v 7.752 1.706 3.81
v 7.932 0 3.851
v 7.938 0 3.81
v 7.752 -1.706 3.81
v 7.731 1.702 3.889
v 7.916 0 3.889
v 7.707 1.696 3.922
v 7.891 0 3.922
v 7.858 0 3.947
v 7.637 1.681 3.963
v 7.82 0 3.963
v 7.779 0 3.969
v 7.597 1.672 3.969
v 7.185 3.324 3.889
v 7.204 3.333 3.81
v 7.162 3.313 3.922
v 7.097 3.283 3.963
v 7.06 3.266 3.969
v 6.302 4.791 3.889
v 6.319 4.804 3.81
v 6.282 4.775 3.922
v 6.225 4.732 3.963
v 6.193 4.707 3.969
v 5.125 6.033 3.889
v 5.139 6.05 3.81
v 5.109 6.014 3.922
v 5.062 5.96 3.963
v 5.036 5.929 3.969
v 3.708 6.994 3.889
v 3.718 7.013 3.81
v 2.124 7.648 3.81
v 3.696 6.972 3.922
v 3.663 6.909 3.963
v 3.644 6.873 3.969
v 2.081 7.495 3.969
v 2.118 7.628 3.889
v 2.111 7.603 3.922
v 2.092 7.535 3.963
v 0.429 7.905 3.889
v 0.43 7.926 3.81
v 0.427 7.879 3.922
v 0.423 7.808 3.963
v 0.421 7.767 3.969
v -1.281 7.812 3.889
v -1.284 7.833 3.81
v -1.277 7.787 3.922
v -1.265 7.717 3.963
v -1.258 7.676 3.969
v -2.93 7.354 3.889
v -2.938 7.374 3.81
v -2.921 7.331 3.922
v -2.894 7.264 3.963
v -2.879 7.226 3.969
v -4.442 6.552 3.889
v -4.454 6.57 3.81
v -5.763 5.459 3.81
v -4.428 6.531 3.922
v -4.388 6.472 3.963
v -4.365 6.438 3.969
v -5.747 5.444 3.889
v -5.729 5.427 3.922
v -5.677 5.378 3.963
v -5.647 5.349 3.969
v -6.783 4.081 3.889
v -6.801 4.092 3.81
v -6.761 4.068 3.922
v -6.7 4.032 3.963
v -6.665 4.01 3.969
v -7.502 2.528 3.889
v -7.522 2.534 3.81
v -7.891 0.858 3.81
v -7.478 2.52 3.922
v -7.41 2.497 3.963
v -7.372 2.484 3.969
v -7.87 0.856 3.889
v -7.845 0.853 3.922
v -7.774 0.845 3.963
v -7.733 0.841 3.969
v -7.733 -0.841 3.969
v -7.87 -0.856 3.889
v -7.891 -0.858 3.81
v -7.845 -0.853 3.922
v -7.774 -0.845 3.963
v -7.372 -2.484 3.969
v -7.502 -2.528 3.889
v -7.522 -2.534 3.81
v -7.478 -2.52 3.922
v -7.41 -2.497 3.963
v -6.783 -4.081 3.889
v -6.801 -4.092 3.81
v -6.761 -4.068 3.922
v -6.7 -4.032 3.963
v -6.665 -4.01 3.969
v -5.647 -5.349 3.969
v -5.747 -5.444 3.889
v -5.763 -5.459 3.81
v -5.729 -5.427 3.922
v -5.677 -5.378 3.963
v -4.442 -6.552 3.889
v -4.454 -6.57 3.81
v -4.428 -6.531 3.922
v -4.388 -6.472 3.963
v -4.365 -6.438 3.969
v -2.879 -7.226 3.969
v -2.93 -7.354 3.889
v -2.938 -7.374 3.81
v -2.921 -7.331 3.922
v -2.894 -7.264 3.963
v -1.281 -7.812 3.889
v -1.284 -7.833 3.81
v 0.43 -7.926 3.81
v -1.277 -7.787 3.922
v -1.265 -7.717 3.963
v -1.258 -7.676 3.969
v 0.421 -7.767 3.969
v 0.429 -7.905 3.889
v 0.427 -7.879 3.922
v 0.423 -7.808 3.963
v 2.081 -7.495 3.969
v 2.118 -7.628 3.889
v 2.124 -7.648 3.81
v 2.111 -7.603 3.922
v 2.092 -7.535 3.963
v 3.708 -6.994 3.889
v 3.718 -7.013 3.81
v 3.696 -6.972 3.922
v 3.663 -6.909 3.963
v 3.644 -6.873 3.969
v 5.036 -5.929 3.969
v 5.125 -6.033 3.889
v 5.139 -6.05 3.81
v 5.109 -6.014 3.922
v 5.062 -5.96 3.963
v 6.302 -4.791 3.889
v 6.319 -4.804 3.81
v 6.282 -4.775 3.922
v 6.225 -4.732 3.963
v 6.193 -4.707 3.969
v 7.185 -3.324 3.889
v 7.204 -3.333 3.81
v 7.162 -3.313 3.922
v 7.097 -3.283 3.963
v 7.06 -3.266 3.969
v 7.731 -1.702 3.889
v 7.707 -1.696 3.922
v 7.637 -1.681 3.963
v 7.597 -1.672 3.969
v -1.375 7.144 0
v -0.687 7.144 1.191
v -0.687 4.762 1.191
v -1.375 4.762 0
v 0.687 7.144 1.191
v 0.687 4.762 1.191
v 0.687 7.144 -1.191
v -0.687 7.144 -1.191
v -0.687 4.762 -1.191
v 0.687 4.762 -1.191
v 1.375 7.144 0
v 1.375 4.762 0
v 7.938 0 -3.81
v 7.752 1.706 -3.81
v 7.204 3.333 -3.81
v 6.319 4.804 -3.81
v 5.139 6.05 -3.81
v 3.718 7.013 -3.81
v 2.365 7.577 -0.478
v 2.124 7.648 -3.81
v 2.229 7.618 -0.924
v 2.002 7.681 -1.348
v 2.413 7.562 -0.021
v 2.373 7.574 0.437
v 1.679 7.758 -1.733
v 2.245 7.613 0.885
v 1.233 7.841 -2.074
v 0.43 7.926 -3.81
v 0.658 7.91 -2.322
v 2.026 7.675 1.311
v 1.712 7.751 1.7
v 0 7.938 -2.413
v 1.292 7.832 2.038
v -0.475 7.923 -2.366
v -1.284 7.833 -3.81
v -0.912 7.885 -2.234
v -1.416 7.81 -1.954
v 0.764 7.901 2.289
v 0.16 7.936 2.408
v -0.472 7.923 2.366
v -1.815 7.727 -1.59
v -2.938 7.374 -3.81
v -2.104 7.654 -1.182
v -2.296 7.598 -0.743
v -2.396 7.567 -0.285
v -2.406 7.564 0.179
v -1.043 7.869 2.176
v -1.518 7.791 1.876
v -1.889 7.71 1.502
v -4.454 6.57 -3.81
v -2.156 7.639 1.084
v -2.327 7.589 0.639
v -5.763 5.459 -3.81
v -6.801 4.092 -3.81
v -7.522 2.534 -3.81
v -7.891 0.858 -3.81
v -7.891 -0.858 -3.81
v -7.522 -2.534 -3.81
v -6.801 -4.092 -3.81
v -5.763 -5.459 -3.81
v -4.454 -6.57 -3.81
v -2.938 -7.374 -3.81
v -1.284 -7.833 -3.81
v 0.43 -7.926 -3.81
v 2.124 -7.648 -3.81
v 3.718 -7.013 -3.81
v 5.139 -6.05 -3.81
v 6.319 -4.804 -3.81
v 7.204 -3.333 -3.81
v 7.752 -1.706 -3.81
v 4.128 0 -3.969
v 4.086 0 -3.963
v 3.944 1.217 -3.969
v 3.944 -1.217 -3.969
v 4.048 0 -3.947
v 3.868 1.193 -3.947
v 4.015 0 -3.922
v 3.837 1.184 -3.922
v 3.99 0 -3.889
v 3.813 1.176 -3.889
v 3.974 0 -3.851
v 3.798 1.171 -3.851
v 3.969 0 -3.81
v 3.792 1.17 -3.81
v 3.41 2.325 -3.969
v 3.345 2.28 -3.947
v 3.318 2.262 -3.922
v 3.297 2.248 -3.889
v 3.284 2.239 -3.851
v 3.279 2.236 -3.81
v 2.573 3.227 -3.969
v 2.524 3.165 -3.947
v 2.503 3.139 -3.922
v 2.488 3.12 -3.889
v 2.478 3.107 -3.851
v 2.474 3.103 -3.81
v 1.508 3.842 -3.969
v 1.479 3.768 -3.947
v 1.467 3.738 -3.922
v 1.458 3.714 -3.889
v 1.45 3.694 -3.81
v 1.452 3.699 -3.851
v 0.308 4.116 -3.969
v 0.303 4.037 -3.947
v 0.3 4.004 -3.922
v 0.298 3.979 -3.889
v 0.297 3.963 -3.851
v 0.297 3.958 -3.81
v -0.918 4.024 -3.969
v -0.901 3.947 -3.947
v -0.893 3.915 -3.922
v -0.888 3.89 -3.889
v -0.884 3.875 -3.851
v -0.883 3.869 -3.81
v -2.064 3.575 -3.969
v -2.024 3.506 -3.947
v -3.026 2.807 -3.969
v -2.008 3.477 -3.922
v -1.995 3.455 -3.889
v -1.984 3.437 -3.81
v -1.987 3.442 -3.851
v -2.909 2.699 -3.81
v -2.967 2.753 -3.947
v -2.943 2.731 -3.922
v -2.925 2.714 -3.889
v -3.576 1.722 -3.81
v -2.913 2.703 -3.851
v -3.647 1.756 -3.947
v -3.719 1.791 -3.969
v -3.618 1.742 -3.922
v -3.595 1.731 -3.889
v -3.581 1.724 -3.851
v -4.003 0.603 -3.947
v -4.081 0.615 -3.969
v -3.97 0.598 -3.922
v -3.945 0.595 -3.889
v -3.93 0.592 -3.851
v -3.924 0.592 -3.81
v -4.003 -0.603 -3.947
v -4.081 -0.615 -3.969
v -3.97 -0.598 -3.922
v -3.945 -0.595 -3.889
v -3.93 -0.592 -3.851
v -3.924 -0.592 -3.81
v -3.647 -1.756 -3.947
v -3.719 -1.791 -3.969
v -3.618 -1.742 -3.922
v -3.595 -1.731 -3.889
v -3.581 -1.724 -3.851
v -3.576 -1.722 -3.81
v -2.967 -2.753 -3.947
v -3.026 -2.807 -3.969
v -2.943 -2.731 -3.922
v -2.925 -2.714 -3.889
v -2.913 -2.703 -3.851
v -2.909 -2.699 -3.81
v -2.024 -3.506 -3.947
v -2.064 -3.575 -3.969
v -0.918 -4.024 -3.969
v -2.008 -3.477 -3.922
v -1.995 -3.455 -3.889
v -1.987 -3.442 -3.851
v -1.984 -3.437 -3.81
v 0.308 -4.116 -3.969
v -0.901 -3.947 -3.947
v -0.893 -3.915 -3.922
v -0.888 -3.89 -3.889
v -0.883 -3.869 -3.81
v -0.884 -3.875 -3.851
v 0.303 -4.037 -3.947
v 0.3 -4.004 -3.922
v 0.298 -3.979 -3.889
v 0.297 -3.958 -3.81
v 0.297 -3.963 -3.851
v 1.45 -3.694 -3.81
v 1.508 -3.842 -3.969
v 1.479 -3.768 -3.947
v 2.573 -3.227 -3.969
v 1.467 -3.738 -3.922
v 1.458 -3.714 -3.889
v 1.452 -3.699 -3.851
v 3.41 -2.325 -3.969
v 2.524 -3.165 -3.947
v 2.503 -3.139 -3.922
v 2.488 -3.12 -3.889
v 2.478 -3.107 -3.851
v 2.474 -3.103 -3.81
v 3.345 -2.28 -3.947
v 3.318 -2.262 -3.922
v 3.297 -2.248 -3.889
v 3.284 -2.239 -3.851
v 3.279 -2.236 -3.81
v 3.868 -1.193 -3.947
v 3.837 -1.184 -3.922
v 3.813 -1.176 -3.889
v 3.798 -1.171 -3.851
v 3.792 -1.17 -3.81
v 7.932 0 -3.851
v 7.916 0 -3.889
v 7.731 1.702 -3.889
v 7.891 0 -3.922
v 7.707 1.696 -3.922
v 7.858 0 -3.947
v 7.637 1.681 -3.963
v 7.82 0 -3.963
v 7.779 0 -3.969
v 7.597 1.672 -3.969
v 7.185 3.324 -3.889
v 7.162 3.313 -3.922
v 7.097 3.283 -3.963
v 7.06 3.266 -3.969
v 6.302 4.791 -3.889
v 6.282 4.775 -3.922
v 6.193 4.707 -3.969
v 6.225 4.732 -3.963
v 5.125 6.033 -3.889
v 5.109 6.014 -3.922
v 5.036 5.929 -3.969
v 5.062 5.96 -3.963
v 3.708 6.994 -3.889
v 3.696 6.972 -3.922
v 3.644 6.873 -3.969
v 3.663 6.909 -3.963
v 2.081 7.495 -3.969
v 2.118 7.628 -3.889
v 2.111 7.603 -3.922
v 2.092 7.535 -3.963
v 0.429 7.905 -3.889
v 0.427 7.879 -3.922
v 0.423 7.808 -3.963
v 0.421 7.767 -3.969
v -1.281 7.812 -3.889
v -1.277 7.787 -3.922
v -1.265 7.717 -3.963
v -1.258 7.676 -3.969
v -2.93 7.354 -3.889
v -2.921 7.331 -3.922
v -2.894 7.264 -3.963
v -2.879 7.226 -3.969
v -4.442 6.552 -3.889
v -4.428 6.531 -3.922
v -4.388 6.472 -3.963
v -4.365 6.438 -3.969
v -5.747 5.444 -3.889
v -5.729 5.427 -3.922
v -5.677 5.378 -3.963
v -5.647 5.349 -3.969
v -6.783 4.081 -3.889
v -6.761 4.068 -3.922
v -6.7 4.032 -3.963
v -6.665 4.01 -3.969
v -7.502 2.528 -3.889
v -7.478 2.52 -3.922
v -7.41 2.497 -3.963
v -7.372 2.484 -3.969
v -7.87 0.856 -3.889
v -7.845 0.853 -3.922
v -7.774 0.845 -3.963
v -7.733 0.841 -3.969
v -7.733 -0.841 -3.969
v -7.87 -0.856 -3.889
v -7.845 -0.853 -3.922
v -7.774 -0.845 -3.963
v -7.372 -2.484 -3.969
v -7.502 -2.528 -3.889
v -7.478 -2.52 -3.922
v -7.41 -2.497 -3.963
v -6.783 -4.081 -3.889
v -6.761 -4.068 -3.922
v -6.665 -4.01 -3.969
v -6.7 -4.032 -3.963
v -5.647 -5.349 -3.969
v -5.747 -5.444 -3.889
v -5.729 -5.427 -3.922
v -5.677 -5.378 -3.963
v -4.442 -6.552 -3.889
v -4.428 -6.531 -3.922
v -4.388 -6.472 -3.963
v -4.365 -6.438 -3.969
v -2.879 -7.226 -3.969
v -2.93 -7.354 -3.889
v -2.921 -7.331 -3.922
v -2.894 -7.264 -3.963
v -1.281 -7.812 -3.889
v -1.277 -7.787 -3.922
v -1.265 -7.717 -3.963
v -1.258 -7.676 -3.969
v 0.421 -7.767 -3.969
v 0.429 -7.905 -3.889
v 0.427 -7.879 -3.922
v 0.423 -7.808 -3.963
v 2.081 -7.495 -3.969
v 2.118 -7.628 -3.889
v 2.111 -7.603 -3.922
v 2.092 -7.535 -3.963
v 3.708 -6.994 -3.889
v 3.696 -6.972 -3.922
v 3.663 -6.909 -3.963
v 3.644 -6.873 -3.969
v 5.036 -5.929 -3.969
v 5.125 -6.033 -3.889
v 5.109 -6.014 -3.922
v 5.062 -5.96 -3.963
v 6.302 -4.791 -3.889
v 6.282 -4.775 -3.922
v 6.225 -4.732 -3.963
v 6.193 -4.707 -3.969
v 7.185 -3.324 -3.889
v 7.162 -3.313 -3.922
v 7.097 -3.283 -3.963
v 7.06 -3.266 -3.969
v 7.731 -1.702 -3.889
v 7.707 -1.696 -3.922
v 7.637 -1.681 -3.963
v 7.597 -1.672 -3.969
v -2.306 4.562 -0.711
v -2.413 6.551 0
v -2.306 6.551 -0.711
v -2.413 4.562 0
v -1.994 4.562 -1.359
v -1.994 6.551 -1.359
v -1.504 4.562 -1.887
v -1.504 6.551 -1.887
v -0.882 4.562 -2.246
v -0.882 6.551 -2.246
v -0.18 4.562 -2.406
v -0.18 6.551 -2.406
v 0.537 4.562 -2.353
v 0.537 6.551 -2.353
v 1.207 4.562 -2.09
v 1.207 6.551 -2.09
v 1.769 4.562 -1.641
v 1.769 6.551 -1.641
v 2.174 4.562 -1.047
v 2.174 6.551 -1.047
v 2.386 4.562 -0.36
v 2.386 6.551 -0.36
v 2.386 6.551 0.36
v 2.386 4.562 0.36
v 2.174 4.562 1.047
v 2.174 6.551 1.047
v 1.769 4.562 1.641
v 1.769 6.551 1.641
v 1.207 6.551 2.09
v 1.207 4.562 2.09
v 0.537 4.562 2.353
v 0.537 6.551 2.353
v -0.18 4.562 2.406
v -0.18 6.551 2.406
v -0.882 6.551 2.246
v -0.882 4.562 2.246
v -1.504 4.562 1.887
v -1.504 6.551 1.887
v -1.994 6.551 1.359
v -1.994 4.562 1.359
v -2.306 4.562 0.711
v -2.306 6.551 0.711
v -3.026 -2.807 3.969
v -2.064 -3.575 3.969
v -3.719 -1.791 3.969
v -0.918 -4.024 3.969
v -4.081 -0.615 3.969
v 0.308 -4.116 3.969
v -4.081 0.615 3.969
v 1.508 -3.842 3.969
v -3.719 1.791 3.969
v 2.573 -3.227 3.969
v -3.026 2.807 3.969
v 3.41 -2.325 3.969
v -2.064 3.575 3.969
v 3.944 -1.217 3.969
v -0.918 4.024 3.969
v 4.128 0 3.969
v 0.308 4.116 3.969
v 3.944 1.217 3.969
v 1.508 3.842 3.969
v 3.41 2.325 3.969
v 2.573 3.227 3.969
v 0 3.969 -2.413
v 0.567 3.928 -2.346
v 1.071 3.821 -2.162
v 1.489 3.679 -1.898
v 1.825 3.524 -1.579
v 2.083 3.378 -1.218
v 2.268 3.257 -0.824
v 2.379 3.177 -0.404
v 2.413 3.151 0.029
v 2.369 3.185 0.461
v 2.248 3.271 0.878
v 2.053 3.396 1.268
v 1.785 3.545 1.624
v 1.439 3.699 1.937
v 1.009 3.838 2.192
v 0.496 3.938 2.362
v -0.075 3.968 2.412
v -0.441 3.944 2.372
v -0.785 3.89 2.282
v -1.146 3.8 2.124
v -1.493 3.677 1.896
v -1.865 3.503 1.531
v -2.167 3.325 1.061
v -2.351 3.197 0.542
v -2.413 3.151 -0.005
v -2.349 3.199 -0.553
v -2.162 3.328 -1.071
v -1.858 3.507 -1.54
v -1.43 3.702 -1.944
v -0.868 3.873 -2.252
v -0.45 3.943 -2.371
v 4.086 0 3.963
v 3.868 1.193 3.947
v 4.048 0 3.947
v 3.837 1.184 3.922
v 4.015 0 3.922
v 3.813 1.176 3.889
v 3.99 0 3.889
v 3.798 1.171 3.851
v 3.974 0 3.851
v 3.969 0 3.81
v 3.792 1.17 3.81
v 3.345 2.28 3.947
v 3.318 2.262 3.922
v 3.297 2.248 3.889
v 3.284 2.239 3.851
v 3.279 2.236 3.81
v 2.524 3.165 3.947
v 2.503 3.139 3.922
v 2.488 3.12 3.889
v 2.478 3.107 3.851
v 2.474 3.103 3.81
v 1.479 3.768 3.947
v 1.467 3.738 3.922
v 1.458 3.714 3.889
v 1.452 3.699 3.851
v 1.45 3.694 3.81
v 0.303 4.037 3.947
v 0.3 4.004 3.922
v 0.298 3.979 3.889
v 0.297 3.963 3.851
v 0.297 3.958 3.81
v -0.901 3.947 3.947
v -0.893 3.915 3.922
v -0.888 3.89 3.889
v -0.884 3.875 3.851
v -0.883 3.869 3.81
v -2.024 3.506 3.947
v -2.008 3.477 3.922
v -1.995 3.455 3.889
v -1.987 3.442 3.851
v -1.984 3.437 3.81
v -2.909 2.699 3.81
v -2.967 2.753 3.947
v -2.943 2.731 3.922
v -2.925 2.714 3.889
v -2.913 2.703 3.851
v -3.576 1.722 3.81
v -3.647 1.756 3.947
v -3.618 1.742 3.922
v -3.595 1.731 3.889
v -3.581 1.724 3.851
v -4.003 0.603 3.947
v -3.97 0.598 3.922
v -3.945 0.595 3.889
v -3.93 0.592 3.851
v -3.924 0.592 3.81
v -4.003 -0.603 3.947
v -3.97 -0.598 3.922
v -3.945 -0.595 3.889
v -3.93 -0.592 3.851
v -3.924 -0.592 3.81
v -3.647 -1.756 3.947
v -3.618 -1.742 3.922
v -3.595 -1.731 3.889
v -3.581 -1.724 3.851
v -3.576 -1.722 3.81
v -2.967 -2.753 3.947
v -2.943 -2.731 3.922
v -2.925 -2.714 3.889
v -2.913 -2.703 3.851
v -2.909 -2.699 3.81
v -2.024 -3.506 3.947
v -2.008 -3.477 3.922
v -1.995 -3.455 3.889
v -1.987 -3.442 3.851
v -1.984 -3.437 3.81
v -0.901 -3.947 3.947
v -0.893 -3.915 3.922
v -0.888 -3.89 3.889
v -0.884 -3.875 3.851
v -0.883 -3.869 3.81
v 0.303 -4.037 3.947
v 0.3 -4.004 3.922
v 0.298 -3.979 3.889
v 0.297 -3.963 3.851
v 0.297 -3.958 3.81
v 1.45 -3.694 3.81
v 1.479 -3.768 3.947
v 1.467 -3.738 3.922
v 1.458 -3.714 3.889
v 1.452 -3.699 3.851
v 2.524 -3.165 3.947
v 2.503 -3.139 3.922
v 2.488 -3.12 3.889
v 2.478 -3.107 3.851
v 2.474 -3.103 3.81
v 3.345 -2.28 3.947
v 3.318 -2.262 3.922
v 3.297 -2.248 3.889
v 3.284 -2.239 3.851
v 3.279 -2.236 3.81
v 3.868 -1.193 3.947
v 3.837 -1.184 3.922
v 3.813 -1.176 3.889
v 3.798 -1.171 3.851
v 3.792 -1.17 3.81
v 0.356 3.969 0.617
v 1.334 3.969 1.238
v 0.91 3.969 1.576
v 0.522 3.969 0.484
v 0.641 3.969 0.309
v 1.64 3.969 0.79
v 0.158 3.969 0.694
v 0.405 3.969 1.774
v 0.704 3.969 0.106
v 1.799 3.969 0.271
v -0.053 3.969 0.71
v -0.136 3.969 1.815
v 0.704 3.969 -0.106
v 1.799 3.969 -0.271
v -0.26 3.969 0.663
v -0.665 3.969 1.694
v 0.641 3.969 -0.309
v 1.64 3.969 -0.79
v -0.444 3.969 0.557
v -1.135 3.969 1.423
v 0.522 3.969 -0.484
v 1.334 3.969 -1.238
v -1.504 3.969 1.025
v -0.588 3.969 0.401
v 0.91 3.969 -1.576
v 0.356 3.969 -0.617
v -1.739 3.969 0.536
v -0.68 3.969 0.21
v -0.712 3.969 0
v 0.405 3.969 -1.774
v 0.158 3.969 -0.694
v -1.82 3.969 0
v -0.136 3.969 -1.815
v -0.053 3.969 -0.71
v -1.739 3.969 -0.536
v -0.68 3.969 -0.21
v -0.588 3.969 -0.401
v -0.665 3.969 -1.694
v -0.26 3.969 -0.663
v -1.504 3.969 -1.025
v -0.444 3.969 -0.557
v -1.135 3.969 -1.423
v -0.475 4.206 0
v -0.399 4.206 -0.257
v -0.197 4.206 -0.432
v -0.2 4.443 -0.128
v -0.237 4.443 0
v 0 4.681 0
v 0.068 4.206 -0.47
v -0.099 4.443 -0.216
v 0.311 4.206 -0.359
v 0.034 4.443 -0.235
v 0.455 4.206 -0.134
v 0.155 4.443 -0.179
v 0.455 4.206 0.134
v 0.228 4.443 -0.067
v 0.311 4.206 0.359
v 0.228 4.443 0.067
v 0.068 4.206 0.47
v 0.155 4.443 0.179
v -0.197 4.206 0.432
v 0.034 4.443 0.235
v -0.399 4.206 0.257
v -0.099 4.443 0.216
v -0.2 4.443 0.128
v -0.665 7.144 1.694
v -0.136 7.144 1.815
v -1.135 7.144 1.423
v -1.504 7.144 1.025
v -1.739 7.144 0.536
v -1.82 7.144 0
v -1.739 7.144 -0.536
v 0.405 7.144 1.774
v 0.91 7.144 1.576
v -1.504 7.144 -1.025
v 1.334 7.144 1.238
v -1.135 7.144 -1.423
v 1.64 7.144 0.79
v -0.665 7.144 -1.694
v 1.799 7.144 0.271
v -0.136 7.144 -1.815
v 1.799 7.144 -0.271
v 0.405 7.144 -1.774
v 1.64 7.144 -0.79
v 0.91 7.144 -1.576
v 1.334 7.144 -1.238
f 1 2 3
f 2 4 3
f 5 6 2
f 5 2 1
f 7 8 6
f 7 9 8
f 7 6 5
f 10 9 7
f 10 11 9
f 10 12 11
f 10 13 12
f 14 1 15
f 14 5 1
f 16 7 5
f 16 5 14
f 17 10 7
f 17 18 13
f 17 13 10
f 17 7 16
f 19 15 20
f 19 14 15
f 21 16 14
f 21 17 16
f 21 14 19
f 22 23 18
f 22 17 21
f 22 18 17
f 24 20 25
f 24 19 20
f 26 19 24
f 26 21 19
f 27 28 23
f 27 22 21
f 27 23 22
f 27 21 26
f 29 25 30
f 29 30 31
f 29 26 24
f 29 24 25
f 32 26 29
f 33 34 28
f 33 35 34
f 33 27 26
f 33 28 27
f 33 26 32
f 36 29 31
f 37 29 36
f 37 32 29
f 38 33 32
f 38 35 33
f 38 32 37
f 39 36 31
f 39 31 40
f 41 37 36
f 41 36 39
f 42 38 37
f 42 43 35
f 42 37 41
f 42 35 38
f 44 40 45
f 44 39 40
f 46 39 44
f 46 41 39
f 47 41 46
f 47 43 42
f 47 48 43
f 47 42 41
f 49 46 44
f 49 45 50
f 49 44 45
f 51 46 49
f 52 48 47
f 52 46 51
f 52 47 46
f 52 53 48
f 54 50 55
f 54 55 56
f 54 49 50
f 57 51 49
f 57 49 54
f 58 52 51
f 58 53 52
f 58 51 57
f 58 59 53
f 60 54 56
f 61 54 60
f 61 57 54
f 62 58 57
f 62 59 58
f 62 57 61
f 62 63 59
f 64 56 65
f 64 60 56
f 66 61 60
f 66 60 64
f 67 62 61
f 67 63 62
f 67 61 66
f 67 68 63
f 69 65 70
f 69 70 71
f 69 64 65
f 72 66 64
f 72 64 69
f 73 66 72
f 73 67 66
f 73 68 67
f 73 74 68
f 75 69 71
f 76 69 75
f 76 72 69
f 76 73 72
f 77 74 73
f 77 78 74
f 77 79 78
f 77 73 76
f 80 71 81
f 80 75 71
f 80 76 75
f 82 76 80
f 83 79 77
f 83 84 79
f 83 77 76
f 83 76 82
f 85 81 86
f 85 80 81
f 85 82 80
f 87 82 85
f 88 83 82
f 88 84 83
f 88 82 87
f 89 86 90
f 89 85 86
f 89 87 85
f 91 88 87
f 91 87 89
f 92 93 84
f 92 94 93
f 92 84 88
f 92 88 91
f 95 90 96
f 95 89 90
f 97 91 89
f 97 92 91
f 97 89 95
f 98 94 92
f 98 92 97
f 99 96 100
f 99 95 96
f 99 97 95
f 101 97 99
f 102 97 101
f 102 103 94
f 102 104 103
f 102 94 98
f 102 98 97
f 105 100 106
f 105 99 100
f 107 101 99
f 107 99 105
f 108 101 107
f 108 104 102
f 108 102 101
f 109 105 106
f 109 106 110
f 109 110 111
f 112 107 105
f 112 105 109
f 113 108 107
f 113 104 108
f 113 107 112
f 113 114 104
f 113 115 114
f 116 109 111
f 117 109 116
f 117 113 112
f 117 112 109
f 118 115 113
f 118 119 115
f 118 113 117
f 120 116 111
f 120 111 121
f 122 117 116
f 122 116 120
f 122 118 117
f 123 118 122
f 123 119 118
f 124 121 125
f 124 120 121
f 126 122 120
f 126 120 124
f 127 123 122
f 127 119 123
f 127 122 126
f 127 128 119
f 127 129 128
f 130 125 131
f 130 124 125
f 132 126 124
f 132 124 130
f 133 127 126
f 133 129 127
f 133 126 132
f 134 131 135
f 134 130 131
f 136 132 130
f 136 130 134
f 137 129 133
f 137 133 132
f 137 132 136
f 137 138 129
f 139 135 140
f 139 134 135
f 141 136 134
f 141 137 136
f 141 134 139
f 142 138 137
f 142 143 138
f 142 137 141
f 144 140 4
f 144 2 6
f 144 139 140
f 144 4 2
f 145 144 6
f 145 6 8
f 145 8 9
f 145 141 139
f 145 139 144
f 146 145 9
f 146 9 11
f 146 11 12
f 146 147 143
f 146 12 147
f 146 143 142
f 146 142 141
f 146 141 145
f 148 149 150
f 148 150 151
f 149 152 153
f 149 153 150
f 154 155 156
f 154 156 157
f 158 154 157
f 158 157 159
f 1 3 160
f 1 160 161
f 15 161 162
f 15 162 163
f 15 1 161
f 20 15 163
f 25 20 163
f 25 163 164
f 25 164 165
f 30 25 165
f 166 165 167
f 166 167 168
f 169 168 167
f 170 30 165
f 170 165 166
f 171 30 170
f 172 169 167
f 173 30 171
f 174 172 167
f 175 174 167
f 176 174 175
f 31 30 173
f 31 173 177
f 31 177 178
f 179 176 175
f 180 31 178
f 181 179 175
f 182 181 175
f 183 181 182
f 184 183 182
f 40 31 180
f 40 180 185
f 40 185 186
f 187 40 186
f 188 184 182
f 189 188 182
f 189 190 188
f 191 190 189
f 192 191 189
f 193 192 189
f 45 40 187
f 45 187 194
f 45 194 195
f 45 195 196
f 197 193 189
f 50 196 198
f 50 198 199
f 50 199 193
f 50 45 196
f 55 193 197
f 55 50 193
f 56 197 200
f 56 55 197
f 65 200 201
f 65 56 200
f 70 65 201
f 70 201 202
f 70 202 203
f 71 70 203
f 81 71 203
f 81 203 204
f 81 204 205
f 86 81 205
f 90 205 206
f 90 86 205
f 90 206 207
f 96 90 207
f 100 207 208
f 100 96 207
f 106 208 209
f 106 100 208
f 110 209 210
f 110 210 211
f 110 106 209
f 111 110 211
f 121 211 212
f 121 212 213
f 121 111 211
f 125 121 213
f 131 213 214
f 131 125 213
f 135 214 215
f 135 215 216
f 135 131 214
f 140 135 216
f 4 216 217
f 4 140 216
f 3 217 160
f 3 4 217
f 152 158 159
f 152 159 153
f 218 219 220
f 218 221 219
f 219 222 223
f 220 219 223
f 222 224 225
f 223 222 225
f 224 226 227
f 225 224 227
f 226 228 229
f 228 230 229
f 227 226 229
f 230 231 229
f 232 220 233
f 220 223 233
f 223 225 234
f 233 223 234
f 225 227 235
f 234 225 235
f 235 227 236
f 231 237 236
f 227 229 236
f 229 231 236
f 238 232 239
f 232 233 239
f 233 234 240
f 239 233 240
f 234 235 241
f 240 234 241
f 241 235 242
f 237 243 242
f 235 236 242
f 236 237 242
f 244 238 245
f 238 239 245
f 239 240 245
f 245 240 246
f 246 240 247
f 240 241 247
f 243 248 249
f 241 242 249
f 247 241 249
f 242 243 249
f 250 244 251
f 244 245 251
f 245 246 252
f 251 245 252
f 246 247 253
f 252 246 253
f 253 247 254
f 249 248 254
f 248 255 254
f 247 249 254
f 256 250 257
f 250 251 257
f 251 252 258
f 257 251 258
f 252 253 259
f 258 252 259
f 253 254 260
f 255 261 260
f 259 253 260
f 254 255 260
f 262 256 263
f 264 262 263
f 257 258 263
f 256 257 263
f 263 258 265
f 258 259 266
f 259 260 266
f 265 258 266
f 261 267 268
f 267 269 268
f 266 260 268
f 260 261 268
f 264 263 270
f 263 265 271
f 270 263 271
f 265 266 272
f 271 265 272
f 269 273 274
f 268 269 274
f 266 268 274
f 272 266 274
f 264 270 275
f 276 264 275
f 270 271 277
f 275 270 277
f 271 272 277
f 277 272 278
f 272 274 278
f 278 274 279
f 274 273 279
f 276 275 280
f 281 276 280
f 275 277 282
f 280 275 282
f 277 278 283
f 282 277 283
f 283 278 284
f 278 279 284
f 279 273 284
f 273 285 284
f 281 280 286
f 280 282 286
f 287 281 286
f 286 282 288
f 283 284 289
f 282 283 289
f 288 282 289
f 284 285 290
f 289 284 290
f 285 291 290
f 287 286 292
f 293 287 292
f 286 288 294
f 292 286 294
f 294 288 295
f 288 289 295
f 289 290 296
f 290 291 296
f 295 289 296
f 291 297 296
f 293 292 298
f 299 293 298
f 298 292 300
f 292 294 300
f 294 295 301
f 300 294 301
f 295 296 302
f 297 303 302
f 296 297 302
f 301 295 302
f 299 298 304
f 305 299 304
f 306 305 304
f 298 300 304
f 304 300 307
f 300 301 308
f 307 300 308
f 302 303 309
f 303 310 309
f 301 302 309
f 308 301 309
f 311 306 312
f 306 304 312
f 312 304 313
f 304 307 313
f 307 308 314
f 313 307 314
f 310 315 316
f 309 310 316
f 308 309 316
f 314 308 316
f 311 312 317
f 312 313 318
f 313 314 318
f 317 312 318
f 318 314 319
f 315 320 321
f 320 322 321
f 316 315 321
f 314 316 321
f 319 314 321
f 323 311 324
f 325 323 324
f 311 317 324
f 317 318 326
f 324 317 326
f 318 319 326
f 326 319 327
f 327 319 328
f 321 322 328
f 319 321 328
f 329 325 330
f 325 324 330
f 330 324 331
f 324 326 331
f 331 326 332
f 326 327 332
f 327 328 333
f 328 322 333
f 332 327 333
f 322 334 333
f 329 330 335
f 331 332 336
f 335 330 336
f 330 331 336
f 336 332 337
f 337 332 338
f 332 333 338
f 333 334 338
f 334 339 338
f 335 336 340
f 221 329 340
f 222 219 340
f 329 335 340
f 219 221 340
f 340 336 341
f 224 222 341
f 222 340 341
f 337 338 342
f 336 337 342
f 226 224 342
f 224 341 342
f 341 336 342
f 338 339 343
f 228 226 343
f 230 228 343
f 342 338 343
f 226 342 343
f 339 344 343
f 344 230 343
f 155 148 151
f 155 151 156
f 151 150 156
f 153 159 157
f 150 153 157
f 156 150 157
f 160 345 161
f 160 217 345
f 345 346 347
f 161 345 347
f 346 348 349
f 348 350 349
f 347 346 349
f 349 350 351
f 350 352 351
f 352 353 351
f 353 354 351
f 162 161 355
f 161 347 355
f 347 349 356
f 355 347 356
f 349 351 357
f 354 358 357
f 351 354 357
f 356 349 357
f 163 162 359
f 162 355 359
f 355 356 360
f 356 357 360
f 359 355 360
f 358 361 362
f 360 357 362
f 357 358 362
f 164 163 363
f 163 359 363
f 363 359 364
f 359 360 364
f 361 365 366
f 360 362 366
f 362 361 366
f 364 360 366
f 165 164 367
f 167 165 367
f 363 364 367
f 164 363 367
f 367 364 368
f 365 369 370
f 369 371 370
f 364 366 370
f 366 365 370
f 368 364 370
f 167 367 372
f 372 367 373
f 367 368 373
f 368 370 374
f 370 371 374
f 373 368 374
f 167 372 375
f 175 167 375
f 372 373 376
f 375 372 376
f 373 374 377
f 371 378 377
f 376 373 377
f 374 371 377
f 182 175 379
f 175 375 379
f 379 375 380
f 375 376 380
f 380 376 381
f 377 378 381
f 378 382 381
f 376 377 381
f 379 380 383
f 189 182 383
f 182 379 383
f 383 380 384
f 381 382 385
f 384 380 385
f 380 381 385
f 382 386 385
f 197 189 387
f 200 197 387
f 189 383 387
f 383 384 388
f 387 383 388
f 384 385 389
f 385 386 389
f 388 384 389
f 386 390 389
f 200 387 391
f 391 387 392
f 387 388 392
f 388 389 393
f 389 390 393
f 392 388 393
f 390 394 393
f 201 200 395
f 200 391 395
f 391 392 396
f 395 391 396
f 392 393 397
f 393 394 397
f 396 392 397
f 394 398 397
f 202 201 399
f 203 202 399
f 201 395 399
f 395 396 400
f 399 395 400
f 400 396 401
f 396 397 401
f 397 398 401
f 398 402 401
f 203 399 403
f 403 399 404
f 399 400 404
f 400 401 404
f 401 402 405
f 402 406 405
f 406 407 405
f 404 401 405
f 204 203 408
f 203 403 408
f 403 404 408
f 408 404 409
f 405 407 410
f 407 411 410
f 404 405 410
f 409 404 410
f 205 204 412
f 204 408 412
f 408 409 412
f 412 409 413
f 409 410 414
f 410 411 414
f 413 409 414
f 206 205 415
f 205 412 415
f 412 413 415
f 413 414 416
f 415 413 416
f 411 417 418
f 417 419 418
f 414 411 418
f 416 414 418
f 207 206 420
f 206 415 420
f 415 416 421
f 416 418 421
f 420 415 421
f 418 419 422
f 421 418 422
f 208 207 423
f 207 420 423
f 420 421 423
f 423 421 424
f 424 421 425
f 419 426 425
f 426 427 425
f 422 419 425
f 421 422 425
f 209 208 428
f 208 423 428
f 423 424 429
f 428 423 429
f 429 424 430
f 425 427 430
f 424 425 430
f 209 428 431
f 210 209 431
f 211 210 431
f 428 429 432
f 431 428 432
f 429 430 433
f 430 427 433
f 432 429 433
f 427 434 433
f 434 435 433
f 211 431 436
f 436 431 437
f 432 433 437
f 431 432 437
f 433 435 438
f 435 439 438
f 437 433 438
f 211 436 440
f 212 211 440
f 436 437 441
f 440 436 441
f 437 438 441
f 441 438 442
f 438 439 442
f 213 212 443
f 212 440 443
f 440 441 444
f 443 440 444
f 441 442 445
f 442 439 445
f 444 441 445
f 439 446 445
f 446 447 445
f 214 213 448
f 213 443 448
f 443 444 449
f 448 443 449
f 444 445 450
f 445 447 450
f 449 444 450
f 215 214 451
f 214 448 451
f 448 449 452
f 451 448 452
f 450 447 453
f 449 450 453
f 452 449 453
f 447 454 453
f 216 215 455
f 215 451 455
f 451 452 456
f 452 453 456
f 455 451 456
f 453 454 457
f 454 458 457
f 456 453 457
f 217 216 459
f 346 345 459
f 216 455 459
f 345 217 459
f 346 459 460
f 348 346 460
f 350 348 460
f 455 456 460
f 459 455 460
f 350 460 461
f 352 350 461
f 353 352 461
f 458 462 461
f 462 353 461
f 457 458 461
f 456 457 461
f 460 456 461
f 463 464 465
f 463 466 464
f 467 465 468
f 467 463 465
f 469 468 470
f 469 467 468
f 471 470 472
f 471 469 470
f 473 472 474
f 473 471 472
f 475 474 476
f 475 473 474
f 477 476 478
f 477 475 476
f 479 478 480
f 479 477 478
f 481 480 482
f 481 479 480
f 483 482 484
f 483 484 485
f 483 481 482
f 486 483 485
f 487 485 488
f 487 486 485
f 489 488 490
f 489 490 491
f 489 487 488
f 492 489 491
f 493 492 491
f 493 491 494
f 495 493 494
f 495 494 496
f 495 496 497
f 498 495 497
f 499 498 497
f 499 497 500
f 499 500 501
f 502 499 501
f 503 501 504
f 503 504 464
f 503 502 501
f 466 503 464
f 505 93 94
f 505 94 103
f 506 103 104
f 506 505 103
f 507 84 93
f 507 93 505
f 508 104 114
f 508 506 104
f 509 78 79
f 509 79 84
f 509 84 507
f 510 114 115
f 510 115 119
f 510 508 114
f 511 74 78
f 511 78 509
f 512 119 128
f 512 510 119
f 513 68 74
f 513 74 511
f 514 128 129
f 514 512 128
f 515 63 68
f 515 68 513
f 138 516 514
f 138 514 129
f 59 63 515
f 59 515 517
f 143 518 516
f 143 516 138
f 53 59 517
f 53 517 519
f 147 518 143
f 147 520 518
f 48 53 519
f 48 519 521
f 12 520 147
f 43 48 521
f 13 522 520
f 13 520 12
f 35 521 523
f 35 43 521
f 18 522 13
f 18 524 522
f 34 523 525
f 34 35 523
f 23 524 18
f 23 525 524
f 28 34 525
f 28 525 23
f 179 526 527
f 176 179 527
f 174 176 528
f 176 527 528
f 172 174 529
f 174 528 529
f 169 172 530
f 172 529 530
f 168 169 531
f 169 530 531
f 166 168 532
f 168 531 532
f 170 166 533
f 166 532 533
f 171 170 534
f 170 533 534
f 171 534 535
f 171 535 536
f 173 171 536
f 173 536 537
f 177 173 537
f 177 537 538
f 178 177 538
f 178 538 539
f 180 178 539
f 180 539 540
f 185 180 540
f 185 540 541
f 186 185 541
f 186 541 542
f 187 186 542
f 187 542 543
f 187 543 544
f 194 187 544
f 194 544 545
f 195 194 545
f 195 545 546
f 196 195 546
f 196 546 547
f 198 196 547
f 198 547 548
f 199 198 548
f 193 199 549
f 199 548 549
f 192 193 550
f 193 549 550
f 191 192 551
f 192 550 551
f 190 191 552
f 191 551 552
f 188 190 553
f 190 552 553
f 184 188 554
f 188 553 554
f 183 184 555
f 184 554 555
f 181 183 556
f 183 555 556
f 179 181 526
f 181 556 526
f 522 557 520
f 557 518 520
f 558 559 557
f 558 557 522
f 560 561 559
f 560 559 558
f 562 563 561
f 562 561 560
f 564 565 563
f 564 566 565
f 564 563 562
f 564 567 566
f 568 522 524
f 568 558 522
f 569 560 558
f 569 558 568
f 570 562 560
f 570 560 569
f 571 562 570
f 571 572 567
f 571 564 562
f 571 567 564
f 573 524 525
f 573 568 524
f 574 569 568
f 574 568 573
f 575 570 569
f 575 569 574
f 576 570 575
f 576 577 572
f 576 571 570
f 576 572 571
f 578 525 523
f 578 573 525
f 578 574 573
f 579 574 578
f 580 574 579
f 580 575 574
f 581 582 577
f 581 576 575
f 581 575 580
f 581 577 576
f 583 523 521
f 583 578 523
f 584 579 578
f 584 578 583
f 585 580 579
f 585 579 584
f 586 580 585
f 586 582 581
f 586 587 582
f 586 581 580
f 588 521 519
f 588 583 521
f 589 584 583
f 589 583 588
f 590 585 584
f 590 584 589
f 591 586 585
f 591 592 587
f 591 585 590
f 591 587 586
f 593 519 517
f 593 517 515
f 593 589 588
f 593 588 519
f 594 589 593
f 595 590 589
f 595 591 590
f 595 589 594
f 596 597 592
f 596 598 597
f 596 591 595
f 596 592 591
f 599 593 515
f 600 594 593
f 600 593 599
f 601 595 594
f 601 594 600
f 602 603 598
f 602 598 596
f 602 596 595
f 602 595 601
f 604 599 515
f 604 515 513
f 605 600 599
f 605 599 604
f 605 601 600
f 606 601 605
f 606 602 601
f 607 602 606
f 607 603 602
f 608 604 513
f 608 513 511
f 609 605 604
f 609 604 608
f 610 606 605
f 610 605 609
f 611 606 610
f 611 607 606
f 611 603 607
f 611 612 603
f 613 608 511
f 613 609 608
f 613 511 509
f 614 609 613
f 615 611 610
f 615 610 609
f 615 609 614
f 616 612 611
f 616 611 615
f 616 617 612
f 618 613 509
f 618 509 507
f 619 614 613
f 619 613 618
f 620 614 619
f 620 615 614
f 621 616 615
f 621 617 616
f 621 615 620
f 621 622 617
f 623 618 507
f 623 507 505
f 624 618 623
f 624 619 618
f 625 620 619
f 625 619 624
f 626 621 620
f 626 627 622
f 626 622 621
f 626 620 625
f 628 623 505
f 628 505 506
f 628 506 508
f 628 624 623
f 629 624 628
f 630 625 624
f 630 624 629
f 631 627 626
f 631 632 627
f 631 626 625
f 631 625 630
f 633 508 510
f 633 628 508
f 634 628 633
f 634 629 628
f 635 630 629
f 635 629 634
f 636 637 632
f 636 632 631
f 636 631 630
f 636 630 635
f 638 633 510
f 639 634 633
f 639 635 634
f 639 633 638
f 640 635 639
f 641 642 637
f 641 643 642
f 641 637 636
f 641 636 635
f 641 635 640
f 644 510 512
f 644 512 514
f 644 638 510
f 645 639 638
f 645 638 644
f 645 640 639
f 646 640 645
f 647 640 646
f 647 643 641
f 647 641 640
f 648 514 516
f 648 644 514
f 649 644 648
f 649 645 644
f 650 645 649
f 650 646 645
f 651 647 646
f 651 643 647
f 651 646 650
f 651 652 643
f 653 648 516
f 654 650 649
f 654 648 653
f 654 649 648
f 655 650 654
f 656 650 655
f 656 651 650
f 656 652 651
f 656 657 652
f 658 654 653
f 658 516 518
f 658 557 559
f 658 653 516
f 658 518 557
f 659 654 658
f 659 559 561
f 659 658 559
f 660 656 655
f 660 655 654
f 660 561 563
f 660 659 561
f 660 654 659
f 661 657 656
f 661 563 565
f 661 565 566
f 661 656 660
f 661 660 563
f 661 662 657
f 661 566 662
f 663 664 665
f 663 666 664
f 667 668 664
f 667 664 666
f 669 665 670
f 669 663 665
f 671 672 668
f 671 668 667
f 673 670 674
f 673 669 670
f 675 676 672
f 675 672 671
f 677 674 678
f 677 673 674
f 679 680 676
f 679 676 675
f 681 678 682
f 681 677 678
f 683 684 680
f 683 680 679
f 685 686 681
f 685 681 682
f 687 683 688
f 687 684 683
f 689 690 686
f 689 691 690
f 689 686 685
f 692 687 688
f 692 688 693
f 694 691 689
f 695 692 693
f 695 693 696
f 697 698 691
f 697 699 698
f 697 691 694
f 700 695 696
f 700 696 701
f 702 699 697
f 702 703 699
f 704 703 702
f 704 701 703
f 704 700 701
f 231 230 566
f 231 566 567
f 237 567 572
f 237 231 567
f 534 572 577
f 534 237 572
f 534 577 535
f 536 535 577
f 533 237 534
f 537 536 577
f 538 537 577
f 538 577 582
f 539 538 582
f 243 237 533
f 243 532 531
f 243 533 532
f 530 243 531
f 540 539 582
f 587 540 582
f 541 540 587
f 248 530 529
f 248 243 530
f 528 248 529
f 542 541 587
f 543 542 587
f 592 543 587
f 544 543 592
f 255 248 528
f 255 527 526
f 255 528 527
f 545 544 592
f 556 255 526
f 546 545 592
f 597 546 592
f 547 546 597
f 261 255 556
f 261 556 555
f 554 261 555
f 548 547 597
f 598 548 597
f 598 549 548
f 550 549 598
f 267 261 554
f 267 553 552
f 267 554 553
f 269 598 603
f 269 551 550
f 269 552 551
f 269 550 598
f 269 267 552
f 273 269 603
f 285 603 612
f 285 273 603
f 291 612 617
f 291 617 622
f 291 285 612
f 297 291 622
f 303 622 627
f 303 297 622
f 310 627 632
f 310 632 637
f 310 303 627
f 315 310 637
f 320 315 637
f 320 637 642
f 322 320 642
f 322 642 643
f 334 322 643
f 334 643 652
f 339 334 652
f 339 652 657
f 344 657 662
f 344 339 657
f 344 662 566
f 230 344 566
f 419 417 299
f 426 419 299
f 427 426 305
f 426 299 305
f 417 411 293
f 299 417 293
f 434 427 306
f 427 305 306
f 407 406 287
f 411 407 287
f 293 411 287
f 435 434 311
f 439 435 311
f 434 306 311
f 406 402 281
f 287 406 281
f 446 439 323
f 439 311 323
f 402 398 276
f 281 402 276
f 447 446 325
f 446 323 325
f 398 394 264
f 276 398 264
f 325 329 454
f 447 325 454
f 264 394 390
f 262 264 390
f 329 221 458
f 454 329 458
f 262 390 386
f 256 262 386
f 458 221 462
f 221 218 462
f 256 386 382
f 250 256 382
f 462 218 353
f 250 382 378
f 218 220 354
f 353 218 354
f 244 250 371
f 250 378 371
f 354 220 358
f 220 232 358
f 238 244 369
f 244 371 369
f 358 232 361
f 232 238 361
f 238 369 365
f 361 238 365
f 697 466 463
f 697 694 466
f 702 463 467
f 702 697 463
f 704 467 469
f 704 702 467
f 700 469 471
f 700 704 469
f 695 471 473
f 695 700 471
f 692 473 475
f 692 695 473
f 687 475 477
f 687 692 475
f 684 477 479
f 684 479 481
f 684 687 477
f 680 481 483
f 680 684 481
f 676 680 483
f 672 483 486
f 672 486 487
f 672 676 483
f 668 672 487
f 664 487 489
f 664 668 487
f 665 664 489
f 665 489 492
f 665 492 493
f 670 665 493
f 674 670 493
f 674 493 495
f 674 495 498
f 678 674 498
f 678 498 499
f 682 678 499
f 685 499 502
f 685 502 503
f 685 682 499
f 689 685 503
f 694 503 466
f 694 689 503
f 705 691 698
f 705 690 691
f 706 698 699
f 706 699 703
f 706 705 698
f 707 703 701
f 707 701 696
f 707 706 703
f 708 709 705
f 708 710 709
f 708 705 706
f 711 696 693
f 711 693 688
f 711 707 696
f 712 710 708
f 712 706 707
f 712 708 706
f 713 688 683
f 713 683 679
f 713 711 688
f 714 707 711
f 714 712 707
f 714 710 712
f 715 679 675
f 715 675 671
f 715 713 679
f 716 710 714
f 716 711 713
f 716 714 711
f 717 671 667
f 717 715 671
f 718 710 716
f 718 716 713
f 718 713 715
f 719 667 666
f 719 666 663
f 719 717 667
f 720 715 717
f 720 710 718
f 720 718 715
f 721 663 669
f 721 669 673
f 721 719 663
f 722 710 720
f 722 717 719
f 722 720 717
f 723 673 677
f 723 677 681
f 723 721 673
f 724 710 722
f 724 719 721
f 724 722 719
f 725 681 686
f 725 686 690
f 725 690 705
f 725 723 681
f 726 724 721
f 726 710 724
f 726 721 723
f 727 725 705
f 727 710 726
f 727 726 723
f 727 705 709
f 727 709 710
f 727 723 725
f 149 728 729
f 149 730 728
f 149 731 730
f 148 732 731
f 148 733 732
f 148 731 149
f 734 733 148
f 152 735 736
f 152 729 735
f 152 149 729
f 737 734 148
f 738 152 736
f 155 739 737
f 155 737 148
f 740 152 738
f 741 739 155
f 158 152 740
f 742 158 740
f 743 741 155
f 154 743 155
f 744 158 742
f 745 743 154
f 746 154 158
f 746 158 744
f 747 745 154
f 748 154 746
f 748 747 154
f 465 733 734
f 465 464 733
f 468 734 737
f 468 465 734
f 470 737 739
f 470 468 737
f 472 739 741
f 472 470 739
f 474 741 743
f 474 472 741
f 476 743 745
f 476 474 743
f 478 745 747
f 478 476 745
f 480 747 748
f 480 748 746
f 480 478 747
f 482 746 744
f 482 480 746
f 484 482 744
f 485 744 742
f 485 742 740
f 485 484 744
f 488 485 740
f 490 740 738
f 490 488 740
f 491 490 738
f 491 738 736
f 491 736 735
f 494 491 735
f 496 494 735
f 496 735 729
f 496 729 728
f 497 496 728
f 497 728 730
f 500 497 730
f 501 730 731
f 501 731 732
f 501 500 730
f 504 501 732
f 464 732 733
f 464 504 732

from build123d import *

# Parameters (mm, degrees)
SKETCH1_R          = 7.9375
SKETCH1_R_2        = 3.96875
EXTRUDE1_DEPTH     = 3.96875
SKETCH2_R          = 2.413
CUT_EXTRUDE1_DEPTH = 8.9375
FILLET1_R          = 0.15875
CUT_EXTRUDE2_DEPTH = 2.38125


with BuildPart() as part:
    # Sketch1 → Extrude1 (new body, symmetric)
    with BuildSketch(Plane.XY):
        Circle(SKETCH1_R)
        Circle(SKETCH1_R_2, mode=Mode.SUBTRACT)
    extrude(amount=EXTRUDE1_DEPTH, both=True)

    # Sketch2 → Cut-Extrude1 (cut, through all)
    with BuildSketch(Plane(origin=(41.275, 0, 0), x_dir=(0, 0, -1), z_dir=(0, -1, 0))):
        with Locations((0, -41.275)):
            Circle(SKETCH2_R)
    extrude(amount=-CUT_EXTRUDE1_DEPTH, mode=Mode.SUBTRACT)

    # Fillet1
    fillet1_edges = [part.edges().sort_by_distance(p)[0] for p in [
        (-7.9375, 0, -3.96875),
        (-7.9375, 0, 3.96875),
        (-3.96875, 0, -3.96875),
        (-3.96875, 0, 3.96875),
    ]]
    fillet(fillet1_edges, radius=FILLET1_R)


with BuildPart() as body_2:
    # Sketch3 → Revolve1 (revolve)
    with BuildSketch(Plane.XY):
        Polygon((-1.819751616, 3.96875), (-0.71189806, 3.96875), (0, 4.68064806), (0, 7.14375), (-1.819751616, 7.14375), (-2.413, 6.550501616), (-2.413, 4.561998384), align=None)
    revolve(axis=Axis((0, 3.96875, 0), (0, -1, 0)))

    # Sketch4 → Cut-Extrude2 (cut)
    with BuildSketch(Plane(origin=(3.3734375, 7.14375, 0), x_dir=(0, 0, -1), z_dir=(0, -1, 0))):
        Polygon((0, -1.998622171), (-1.190625, -2.686029836), (-1.190625, -4.060845164), (0, -4.748252829), (1.190625, -4.060845164), (1.190625, -2.686029836), align=None)
    extrude(amount=CUT_EXTRUDE2_DEPTH, mode=Mode.SUBTRACT)


solid = Compound([part.part, body_2.part])
